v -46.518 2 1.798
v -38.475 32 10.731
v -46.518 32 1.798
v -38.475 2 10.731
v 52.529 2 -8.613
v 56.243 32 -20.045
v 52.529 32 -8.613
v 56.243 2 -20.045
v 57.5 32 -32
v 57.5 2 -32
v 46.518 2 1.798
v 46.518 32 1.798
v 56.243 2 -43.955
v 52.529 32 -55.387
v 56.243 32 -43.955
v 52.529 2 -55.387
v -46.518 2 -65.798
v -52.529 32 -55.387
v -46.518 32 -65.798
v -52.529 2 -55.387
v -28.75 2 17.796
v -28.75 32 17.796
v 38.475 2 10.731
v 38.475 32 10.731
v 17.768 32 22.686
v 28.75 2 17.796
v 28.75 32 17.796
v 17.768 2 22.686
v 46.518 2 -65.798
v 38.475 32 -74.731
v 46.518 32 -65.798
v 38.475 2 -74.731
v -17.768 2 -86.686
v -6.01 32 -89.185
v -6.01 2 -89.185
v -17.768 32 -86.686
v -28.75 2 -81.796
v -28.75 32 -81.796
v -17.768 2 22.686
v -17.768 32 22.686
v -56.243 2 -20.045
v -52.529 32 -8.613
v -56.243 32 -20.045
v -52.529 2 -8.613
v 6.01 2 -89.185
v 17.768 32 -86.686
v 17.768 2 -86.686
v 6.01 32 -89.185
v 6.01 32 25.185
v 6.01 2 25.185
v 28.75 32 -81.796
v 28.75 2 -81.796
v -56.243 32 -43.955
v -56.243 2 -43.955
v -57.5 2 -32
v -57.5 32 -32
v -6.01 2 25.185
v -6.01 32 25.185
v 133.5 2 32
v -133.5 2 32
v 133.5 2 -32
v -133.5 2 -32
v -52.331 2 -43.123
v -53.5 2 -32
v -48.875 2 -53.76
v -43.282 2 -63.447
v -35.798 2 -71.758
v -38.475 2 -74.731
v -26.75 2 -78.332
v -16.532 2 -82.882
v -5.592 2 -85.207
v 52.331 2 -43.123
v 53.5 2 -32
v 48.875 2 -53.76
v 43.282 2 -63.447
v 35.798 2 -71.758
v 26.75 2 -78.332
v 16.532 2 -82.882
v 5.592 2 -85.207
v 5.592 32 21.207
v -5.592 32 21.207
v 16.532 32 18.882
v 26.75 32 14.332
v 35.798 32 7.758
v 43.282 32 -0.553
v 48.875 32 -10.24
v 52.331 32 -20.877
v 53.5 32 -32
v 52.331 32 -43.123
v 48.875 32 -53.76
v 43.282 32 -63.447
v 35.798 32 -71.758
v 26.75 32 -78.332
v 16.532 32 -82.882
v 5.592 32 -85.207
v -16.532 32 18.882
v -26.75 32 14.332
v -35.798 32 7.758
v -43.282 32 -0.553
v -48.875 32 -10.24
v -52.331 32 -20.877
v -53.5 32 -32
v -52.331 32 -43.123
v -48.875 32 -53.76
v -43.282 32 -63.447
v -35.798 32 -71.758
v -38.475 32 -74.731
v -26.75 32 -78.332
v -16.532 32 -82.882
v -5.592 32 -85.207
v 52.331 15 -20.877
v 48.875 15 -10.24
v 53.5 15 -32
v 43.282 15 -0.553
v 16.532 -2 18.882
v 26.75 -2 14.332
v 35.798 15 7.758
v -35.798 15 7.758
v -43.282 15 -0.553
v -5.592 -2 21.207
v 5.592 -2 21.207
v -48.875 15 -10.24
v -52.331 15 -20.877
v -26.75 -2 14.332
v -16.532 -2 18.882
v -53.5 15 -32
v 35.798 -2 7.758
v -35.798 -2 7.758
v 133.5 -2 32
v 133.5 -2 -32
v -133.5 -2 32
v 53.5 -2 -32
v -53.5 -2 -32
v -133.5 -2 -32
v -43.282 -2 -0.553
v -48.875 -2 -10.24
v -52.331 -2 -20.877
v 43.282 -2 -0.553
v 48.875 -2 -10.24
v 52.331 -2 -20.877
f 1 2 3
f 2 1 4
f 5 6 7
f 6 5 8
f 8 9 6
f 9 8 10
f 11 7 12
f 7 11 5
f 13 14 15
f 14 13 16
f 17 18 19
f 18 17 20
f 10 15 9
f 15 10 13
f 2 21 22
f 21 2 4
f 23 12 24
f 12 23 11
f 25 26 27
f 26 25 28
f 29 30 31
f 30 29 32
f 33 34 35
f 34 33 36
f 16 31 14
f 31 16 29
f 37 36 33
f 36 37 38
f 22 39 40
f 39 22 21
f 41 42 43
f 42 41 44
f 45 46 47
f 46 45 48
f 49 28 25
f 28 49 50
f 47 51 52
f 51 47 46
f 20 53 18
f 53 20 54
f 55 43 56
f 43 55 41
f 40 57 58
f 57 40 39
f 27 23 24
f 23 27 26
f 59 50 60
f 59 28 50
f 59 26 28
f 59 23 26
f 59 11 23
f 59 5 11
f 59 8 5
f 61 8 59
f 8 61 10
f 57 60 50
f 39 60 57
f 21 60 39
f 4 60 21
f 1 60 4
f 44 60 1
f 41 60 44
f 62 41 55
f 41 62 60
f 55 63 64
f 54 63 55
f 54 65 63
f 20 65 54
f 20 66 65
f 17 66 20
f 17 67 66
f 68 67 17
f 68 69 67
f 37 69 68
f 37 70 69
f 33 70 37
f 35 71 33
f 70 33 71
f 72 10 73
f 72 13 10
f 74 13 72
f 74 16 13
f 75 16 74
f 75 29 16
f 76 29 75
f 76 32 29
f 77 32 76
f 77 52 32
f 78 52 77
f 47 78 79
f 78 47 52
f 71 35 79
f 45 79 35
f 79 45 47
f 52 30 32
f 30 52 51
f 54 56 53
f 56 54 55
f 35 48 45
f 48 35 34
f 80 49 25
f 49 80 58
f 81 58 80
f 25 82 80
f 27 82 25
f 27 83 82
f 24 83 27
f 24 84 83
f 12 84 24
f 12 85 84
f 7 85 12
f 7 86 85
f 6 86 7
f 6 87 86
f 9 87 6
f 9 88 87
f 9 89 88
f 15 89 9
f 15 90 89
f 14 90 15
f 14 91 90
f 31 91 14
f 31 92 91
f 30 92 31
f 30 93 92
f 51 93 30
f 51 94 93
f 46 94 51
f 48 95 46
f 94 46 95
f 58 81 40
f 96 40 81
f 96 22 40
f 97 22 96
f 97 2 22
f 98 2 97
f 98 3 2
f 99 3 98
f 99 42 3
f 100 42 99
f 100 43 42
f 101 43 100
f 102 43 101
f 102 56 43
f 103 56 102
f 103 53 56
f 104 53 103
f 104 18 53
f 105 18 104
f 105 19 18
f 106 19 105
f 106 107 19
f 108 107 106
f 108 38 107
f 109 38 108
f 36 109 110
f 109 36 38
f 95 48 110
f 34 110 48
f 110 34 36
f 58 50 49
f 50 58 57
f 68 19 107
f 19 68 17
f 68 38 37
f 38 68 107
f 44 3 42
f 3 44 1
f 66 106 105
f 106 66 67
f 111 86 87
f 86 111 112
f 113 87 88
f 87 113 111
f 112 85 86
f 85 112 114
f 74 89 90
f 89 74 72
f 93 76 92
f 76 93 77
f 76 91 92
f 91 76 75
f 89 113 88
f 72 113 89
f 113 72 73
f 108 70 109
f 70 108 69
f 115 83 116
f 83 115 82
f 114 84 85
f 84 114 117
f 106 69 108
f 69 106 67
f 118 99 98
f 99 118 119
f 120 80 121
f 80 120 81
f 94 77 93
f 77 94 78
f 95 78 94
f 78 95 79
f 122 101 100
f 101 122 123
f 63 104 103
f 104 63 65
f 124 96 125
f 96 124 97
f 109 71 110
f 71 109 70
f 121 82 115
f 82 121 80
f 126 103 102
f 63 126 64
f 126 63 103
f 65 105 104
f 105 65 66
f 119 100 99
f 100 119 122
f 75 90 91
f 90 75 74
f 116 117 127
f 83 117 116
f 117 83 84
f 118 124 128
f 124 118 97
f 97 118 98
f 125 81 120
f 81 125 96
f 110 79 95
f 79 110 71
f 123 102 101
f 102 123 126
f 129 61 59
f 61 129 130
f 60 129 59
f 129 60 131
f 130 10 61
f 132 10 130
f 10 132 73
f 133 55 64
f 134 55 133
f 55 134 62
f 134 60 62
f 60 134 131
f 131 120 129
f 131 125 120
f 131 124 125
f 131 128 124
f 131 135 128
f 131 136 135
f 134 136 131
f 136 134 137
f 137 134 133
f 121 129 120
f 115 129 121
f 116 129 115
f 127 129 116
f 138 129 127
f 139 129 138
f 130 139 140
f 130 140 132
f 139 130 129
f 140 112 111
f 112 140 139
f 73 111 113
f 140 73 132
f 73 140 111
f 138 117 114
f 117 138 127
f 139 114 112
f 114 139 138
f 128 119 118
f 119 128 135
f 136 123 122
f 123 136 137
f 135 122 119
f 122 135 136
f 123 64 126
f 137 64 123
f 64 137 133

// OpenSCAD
cover_x = 267; // 266.7mm, 10.5 inches
cover_y = 64; // 63.5mm, 2.5 inches
cover_z = 4;

vent_radius = 115 / 2;
vent_depth = 30;
vent_offset_z = -cover_y / 2;
vent_offset_y = (cover_z + vent_depth) / 2;
vent_thickness = 2;

difference() {
    union() {
        // Back cover
        cube([cover_x, cover_z, cover_y], true);
        
        // Vent duct
        translate([0, vent_offset_y, vent_offset_z]) {
            rotate([90, 0, 0]) {
                difference() {
                    // Outer
                    cylinder(vent_depth, vent_radius, vent_radius, true);
                    // Inner cutout
                    cylinder(vent_depth, vent_radius - vent_thickness * 2, vent_radius - vent_thickness * 2, true);
                }
            }
        }
    }
    
    // Vent hole cutout from cover
    translate([0, 0, vent_offset_z]) {
        rotate([90, 0, 0]) {
            // Inner cutout, not translated for base plate thickness
            cylinder(vent_depth,vent_radius - vent_thickness * 2, vent_radius - vent_thickness * 2, true);
        }
    }
}
